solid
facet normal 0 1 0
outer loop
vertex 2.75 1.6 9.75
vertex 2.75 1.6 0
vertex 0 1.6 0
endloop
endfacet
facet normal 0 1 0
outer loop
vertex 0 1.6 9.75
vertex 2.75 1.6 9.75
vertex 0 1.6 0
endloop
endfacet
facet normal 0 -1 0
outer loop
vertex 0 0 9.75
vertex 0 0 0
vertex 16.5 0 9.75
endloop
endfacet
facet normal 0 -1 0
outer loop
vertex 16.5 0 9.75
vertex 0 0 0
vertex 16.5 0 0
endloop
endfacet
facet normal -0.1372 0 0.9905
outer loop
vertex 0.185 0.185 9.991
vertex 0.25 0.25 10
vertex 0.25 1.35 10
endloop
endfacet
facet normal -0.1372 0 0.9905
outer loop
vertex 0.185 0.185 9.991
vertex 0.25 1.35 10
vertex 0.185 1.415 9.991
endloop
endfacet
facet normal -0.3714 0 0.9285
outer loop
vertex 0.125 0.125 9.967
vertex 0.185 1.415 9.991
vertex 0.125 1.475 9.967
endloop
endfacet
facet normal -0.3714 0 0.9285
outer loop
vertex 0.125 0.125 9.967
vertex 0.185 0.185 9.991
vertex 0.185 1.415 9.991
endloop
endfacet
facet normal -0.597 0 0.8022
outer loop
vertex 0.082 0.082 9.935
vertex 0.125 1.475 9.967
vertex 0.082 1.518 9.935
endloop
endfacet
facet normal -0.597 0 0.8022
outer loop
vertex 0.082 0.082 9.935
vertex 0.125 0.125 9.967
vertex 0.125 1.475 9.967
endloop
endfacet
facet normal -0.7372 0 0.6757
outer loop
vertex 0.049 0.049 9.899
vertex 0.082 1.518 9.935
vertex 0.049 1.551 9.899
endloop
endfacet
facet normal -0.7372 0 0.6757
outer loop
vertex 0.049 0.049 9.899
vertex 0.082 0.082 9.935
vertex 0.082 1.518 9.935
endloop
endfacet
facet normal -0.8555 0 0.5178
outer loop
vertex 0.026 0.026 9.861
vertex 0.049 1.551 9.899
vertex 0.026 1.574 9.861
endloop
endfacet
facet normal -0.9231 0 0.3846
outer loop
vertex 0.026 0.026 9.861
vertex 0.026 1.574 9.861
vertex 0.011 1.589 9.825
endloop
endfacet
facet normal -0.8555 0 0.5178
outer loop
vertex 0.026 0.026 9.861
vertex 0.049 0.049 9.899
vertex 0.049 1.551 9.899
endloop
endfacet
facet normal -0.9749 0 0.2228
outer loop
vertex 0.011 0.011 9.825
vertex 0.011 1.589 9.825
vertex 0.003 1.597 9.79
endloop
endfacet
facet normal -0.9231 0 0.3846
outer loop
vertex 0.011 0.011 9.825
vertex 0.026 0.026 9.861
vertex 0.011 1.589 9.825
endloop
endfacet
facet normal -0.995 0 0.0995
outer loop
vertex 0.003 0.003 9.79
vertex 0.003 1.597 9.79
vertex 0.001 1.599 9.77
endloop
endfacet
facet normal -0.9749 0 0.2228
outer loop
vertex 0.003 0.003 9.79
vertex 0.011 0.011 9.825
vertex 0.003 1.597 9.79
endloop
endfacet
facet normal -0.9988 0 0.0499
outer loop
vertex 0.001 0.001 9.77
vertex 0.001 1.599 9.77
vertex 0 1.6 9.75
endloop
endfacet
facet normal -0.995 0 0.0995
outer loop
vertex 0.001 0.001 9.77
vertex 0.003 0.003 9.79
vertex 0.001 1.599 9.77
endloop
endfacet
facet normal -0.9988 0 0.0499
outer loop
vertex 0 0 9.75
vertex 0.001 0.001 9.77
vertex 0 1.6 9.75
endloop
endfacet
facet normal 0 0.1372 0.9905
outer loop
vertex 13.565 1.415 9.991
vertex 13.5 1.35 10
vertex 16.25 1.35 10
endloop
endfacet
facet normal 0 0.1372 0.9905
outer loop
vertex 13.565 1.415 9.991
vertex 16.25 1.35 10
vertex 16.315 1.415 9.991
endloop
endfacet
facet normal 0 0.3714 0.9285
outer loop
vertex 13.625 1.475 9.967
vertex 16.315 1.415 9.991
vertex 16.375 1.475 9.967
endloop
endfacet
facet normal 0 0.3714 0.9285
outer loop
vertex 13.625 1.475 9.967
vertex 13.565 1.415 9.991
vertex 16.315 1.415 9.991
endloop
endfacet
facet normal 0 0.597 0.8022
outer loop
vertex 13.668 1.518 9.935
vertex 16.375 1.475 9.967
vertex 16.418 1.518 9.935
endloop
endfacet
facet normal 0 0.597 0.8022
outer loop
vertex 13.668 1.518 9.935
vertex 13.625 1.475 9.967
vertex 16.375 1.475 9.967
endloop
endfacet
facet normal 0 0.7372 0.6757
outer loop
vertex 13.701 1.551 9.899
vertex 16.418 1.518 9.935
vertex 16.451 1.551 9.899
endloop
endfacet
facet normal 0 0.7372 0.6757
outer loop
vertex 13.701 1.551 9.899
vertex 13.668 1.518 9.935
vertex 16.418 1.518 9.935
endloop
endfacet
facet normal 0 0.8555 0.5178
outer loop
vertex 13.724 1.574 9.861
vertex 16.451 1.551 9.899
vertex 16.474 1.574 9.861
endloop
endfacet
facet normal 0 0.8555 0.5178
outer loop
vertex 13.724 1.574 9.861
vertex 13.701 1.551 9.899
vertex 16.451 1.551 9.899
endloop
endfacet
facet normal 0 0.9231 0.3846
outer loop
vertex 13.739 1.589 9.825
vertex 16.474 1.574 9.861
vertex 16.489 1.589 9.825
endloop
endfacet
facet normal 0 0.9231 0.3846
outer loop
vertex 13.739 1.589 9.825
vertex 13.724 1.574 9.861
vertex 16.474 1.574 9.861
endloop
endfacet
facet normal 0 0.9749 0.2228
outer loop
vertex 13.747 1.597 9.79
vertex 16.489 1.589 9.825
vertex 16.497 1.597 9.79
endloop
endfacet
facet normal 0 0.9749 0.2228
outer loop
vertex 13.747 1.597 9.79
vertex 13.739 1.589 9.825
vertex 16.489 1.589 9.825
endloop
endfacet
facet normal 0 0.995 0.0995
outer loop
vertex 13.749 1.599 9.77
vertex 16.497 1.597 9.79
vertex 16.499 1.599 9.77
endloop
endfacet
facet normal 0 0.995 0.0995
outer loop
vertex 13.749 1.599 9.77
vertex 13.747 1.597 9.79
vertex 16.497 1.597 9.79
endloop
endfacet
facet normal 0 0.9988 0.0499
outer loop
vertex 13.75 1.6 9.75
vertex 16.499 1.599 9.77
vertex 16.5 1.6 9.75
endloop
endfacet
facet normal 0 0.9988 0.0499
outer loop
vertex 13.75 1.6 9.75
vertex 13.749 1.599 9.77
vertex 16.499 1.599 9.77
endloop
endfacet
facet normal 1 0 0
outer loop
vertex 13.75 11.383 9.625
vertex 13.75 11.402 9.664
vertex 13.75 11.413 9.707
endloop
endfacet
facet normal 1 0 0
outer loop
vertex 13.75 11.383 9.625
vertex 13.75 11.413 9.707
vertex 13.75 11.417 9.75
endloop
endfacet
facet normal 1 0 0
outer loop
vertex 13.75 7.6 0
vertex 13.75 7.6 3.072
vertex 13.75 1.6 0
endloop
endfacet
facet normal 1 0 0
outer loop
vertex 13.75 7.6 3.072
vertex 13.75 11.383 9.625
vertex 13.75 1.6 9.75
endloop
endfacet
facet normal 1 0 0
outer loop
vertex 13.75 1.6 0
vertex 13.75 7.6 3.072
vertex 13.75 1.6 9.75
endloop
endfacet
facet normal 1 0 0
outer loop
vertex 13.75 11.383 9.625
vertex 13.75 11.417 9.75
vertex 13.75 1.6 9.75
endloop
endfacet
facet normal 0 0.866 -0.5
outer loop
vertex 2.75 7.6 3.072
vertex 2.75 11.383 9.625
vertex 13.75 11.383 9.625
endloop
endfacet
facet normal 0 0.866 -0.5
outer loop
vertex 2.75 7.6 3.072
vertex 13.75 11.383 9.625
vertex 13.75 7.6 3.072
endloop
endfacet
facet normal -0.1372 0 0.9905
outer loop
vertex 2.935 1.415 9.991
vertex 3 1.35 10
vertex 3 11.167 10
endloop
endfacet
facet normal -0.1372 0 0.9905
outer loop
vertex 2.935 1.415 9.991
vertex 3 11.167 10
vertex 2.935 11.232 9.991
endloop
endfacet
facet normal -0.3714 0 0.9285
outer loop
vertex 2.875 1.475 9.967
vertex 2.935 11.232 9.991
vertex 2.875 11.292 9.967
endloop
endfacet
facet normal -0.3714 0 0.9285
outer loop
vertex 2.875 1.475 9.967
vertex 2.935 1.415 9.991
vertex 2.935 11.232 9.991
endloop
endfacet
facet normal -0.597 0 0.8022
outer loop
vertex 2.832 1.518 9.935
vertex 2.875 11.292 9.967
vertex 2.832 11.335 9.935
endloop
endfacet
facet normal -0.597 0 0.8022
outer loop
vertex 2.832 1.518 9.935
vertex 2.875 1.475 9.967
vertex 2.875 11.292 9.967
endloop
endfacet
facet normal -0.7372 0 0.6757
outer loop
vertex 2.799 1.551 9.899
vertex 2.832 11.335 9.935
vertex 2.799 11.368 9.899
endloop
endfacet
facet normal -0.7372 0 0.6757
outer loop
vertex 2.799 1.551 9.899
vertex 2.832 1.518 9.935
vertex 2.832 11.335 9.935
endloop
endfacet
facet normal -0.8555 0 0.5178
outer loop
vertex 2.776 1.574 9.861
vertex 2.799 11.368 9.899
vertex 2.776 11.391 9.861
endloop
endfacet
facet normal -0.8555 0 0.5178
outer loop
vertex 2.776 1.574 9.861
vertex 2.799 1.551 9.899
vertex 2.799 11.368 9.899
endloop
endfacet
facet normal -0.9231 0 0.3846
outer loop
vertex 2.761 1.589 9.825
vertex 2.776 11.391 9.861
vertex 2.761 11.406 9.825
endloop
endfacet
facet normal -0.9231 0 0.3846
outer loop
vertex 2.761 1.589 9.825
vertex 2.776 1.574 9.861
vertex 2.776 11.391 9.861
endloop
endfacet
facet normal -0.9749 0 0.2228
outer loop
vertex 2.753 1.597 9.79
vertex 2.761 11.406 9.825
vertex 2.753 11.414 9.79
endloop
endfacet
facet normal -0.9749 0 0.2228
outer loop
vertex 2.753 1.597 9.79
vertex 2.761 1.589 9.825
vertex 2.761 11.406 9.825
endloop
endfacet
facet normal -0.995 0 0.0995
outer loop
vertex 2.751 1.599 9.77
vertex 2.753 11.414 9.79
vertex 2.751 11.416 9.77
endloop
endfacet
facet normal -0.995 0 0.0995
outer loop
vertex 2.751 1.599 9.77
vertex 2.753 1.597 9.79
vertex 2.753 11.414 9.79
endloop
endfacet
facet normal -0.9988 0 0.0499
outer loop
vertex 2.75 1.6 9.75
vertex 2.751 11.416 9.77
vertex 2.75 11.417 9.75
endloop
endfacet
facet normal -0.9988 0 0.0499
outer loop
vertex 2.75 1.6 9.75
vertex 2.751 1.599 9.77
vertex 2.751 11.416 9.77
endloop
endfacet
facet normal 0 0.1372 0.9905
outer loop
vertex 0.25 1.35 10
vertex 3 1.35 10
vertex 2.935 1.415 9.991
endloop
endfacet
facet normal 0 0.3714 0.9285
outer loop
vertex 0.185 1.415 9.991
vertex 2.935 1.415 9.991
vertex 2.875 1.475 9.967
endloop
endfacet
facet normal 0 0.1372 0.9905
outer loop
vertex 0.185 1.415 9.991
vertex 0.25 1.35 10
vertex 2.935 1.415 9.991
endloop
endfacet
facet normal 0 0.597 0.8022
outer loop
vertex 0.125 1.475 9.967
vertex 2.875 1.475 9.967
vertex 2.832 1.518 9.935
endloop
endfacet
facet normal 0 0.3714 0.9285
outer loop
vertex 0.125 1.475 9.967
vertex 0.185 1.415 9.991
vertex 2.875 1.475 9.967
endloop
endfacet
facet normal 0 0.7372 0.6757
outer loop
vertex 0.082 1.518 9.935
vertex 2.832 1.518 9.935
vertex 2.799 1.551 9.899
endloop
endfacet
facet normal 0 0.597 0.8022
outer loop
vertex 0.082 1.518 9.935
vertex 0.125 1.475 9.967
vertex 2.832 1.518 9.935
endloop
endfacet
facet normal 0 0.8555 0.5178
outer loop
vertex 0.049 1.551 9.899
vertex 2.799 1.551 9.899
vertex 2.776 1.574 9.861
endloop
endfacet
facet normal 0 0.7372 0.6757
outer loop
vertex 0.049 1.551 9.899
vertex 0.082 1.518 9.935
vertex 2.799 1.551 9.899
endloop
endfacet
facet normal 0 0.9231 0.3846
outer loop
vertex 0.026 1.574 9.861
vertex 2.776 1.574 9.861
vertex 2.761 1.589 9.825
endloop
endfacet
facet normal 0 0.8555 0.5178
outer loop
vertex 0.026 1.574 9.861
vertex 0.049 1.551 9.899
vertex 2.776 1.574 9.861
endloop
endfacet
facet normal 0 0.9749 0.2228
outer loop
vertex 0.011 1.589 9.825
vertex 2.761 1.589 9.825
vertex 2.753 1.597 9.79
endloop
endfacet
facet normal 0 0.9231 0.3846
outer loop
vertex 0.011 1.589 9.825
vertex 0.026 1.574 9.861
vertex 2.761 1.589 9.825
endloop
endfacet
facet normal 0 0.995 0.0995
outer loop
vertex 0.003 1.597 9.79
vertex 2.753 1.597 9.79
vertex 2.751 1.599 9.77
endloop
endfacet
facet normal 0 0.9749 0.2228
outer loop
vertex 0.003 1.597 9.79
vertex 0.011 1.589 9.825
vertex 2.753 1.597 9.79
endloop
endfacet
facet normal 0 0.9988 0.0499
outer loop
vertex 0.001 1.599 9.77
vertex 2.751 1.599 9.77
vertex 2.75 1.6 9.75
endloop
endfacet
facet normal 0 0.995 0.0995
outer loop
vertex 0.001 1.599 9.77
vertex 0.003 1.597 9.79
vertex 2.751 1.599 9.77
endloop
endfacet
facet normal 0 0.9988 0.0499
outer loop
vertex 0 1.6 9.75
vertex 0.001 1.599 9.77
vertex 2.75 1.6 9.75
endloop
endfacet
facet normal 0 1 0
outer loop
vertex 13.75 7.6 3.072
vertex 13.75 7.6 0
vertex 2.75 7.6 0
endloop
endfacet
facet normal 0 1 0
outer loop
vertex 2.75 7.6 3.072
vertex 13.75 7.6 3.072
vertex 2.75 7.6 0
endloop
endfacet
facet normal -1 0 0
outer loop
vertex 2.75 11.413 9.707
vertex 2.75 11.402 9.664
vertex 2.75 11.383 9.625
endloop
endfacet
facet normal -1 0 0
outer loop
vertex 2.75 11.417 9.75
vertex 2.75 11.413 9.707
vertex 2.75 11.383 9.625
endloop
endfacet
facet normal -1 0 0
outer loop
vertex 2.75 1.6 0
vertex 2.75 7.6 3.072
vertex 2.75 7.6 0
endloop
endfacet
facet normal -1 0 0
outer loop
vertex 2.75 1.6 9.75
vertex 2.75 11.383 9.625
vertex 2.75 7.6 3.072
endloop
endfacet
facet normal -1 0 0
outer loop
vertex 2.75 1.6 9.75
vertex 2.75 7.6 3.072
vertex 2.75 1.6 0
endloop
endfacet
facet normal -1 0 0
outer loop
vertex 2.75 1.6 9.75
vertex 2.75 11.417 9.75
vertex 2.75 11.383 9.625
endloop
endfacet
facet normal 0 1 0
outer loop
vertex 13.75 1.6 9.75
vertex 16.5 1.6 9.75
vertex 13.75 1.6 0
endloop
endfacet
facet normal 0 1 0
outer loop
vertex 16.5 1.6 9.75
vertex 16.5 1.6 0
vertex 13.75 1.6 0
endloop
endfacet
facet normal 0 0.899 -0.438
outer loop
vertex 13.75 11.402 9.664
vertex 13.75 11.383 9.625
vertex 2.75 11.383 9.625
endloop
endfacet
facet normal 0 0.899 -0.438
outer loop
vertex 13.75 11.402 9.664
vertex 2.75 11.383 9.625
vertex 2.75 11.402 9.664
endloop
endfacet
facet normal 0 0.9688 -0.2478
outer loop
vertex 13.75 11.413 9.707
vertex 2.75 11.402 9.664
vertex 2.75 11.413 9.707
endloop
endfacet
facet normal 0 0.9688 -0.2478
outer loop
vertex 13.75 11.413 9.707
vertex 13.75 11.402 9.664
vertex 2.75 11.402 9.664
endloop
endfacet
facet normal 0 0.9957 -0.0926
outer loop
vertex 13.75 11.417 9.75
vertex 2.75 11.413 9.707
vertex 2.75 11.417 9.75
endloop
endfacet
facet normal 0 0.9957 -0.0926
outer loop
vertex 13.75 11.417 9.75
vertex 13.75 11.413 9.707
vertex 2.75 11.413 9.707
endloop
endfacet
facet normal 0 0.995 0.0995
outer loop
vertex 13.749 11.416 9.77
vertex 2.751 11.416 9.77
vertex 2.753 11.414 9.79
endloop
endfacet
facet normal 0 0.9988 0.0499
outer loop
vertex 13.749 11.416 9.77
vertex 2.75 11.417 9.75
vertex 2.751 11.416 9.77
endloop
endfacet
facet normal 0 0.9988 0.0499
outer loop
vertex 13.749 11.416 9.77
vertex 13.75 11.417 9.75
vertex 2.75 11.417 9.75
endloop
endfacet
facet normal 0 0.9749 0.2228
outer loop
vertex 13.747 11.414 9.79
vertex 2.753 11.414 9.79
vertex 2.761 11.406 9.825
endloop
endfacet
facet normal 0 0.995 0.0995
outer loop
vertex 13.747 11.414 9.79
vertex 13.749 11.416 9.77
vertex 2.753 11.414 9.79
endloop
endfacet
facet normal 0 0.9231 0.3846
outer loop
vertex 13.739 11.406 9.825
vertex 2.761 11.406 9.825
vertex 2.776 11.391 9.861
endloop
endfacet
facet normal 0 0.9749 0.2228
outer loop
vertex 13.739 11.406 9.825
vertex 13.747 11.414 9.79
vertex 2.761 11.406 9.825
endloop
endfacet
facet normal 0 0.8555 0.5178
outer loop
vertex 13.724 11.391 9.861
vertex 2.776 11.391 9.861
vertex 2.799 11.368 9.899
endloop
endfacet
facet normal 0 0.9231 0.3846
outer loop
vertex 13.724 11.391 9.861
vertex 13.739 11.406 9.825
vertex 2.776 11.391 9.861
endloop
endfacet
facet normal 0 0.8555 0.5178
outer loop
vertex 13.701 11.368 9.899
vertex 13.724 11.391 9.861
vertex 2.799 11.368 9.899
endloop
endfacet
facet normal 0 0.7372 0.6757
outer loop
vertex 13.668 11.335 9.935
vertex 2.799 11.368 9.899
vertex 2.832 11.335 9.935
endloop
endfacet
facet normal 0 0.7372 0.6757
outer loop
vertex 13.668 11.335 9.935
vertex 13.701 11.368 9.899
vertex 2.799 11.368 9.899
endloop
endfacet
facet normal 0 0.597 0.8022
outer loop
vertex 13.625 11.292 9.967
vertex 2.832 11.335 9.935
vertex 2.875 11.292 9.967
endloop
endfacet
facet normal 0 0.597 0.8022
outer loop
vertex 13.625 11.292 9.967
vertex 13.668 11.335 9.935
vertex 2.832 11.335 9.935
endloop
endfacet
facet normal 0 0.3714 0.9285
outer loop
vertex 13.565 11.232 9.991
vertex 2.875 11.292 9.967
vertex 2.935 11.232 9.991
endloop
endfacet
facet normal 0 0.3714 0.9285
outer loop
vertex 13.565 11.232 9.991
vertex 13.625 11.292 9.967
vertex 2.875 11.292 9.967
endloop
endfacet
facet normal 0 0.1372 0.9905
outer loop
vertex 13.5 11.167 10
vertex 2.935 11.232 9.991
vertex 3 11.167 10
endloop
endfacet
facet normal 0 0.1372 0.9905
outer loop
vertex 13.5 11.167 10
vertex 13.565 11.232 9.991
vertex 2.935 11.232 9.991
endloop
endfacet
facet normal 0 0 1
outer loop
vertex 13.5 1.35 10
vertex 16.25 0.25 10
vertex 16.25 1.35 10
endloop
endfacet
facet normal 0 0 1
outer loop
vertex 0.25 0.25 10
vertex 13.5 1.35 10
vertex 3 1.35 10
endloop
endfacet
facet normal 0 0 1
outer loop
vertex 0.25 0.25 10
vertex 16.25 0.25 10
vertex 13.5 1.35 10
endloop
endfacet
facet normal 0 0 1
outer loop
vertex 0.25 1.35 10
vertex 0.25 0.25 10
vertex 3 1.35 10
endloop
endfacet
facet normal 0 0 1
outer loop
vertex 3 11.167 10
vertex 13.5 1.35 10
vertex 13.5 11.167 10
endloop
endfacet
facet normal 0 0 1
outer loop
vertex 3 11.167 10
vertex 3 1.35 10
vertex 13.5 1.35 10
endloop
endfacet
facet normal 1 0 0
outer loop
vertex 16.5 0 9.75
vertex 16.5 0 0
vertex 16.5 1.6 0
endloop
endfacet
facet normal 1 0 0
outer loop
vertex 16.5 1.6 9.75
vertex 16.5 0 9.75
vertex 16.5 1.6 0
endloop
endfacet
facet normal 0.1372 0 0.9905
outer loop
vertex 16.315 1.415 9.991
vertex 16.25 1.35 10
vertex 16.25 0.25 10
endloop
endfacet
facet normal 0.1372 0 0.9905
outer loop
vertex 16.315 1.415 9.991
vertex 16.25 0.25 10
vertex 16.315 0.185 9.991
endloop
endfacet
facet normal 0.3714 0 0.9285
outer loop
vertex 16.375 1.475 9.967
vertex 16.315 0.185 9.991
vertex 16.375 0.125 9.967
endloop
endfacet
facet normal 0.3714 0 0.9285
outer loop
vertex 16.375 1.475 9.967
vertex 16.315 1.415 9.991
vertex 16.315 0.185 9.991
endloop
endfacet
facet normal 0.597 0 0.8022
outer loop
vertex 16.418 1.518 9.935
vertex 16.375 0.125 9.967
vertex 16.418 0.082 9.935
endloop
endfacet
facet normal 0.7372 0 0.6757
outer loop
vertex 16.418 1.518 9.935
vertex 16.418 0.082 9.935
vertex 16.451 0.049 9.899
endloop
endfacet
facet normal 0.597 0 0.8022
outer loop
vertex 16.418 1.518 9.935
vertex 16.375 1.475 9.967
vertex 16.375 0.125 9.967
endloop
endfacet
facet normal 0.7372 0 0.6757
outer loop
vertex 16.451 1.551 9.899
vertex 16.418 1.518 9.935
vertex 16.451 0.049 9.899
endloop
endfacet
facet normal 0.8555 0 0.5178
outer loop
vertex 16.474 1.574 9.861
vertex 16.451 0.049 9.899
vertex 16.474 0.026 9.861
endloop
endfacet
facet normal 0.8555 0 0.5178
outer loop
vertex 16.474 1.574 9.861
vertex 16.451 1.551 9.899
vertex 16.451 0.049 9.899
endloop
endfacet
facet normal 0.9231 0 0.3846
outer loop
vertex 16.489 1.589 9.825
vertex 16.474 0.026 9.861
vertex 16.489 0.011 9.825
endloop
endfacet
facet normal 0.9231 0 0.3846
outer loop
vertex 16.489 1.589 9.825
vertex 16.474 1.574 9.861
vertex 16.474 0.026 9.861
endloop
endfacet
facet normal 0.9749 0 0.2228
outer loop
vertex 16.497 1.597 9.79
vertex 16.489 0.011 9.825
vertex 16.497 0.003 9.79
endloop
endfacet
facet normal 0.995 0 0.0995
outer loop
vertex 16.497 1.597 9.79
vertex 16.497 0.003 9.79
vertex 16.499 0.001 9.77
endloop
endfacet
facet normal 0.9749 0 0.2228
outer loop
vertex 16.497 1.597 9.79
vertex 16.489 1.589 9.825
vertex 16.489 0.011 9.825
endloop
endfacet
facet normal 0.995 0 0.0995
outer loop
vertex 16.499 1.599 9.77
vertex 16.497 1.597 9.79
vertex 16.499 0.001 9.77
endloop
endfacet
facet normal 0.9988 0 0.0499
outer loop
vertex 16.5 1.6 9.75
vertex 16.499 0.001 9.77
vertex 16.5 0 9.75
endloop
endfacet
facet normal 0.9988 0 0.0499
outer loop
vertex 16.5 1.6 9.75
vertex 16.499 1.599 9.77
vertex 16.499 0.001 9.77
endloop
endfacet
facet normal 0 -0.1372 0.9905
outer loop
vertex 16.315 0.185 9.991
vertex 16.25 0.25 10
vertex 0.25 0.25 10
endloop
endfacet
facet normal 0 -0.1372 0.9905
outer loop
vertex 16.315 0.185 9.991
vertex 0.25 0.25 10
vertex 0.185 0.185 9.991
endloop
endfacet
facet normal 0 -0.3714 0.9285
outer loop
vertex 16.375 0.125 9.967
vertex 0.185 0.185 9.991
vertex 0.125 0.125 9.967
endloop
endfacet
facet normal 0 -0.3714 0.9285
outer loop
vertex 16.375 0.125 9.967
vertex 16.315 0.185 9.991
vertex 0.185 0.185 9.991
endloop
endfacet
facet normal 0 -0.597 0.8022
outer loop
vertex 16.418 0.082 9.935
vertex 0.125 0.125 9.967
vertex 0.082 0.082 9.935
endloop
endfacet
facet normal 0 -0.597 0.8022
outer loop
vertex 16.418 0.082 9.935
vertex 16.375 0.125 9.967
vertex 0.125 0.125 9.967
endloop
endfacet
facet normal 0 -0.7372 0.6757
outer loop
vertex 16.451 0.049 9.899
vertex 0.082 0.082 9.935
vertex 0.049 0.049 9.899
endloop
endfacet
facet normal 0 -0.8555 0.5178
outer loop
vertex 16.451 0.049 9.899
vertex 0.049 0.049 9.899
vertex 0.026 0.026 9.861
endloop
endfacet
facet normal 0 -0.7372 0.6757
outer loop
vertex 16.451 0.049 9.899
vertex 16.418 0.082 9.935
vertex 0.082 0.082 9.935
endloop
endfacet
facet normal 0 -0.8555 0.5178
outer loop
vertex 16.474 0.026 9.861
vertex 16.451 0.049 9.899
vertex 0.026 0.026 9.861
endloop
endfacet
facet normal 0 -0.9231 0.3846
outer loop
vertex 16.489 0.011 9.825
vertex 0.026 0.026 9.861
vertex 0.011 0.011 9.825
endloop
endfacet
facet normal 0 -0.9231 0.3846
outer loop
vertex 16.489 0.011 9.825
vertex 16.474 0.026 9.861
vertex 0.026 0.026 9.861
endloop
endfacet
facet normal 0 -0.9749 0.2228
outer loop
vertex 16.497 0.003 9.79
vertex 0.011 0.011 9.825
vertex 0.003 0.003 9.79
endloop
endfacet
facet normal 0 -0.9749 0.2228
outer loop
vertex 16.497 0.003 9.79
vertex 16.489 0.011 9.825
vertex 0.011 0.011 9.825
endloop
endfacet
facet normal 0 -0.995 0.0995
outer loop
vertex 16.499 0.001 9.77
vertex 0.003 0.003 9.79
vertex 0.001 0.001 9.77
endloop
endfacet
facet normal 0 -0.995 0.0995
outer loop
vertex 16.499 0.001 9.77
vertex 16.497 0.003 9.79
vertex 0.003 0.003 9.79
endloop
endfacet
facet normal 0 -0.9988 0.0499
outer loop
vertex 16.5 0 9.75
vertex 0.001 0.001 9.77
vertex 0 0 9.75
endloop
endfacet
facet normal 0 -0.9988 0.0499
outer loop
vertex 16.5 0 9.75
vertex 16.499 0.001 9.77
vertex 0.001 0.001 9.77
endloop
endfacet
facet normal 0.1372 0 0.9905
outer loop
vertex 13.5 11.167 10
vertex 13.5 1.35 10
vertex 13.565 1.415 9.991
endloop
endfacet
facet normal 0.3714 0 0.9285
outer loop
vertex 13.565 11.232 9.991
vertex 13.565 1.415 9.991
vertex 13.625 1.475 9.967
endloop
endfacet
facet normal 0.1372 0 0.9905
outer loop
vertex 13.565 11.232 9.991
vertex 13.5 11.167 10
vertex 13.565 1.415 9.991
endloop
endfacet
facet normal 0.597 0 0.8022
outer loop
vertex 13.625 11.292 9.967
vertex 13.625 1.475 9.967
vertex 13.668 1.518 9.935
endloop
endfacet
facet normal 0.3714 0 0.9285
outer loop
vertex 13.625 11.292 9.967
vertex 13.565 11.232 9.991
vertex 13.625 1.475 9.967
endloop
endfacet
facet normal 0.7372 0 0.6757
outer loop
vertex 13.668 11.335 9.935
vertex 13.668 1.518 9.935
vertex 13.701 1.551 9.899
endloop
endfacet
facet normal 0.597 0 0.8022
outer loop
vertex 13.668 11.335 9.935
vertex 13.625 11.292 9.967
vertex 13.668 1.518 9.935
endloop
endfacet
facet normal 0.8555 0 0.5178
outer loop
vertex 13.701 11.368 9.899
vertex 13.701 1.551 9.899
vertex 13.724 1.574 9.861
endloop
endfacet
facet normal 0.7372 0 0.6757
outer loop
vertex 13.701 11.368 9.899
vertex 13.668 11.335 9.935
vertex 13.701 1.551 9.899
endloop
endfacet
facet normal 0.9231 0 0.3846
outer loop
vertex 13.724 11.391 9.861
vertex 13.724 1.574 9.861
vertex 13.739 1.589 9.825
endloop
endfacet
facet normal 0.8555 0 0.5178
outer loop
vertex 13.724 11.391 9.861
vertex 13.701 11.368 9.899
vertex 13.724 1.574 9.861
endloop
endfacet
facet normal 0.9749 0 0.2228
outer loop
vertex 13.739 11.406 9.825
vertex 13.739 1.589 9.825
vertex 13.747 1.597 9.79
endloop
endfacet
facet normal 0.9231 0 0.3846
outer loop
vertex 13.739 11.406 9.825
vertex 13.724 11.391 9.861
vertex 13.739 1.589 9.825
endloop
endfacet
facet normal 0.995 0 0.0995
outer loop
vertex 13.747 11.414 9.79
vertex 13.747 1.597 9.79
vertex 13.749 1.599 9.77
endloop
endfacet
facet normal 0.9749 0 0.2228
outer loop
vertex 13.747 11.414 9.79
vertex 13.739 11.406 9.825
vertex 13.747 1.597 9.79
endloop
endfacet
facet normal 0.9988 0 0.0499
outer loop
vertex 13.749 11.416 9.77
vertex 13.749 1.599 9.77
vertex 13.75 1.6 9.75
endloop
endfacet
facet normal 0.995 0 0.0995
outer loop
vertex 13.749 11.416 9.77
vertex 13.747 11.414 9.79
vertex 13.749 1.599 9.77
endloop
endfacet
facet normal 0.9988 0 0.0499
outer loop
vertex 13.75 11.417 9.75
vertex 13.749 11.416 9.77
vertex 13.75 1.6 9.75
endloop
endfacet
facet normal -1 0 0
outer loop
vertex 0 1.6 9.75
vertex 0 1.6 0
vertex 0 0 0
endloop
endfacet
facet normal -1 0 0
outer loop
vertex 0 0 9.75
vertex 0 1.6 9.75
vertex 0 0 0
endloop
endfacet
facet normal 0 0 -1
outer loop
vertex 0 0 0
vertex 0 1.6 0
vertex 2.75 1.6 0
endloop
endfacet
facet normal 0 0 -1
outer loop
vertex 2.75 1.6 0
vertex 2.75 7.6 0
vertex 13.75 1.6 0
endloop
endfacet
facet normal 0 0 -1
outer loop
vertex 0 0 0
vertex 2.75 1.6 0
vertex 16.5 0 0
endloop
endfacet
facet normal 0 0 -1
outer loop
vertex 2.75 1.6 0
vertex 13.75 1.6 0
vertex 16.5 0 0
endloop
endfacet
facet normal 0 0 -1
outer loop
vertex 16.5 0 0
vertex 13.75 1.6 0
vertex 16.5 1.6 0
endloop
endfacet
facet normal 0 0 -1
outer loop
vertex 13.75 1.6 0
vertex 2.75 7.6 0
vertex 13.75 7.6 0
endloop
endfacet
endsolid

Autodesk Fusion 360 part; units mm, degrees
sketch "Sketch1" plane through (0, 0, 0) normal (0, 0, 1) x (1, 0, 0)
  line L0 (0, 0) -> (16.5, 0)
  line L1 (16.5, 0) -> (16.5, 1.6)
  line L2 (16.5, 1.6) -> (0, 1.6)
  line L3 (0, 1.6) -> (0, 0)
  line L4 (2.75, 1.6) -> (13.75, 1.6)
  line L5 (13.75, 1.6) -> (13.75, 7.6)
  line L6 (13.75, 7.6) -> (2.75, 7.6)
  line L7 (2.75, 7.6) -> (2.75, 1.6)
  dimension "d1" = 16.5
  dimension "d2" = 1.6
  dimension "d3" = 11
  dimension "d4" = 6
  dimension "d5" = 2.75
extrude "Extrude1" add sketch "Sketch1" along normal blind 10
sketch "Sketch2" plane through (2.75, 0, 0) normal (-1, 0, 0) x (0, -1, 0)
  line L0 (-7.6, 0) -> (-1.6, 0)
  line L1 (-1.6, 0) -> (-1.6, 10)
  line L2 (-1.6, 10) -> (-7.6, 10)
  line L3 (-7.6, 10) -> (-7.6, 0)
  line L4 (-7.6, 10) -> (-11.6, 10)
  line L5 (-11.6, 10) -> (-7.6, 3.0718)
  line L6 (-11.6, 10) -> (-3.6, 10) construction
  dimension "d8" = 4
  dimension "d9" = 60
extrude "Extrude2" add sketch "Sketch2" against normal blind 11 contours L3 L4 L5
fillet "Fillet1" radius 0.25 8 edges at (2.75, 6.6, 10) (1.375, 1.6, 10) (0, 0.8, 10) (8.25, 0, 10) (16.5, 0.8, 10) (15.125, 1.6, 10) (13.75, 6.6, 10) (8.25, 11.6, 10)
equation "d5 = ( ( 16.5 - 11 ) / 2 ) * 1 mm"
